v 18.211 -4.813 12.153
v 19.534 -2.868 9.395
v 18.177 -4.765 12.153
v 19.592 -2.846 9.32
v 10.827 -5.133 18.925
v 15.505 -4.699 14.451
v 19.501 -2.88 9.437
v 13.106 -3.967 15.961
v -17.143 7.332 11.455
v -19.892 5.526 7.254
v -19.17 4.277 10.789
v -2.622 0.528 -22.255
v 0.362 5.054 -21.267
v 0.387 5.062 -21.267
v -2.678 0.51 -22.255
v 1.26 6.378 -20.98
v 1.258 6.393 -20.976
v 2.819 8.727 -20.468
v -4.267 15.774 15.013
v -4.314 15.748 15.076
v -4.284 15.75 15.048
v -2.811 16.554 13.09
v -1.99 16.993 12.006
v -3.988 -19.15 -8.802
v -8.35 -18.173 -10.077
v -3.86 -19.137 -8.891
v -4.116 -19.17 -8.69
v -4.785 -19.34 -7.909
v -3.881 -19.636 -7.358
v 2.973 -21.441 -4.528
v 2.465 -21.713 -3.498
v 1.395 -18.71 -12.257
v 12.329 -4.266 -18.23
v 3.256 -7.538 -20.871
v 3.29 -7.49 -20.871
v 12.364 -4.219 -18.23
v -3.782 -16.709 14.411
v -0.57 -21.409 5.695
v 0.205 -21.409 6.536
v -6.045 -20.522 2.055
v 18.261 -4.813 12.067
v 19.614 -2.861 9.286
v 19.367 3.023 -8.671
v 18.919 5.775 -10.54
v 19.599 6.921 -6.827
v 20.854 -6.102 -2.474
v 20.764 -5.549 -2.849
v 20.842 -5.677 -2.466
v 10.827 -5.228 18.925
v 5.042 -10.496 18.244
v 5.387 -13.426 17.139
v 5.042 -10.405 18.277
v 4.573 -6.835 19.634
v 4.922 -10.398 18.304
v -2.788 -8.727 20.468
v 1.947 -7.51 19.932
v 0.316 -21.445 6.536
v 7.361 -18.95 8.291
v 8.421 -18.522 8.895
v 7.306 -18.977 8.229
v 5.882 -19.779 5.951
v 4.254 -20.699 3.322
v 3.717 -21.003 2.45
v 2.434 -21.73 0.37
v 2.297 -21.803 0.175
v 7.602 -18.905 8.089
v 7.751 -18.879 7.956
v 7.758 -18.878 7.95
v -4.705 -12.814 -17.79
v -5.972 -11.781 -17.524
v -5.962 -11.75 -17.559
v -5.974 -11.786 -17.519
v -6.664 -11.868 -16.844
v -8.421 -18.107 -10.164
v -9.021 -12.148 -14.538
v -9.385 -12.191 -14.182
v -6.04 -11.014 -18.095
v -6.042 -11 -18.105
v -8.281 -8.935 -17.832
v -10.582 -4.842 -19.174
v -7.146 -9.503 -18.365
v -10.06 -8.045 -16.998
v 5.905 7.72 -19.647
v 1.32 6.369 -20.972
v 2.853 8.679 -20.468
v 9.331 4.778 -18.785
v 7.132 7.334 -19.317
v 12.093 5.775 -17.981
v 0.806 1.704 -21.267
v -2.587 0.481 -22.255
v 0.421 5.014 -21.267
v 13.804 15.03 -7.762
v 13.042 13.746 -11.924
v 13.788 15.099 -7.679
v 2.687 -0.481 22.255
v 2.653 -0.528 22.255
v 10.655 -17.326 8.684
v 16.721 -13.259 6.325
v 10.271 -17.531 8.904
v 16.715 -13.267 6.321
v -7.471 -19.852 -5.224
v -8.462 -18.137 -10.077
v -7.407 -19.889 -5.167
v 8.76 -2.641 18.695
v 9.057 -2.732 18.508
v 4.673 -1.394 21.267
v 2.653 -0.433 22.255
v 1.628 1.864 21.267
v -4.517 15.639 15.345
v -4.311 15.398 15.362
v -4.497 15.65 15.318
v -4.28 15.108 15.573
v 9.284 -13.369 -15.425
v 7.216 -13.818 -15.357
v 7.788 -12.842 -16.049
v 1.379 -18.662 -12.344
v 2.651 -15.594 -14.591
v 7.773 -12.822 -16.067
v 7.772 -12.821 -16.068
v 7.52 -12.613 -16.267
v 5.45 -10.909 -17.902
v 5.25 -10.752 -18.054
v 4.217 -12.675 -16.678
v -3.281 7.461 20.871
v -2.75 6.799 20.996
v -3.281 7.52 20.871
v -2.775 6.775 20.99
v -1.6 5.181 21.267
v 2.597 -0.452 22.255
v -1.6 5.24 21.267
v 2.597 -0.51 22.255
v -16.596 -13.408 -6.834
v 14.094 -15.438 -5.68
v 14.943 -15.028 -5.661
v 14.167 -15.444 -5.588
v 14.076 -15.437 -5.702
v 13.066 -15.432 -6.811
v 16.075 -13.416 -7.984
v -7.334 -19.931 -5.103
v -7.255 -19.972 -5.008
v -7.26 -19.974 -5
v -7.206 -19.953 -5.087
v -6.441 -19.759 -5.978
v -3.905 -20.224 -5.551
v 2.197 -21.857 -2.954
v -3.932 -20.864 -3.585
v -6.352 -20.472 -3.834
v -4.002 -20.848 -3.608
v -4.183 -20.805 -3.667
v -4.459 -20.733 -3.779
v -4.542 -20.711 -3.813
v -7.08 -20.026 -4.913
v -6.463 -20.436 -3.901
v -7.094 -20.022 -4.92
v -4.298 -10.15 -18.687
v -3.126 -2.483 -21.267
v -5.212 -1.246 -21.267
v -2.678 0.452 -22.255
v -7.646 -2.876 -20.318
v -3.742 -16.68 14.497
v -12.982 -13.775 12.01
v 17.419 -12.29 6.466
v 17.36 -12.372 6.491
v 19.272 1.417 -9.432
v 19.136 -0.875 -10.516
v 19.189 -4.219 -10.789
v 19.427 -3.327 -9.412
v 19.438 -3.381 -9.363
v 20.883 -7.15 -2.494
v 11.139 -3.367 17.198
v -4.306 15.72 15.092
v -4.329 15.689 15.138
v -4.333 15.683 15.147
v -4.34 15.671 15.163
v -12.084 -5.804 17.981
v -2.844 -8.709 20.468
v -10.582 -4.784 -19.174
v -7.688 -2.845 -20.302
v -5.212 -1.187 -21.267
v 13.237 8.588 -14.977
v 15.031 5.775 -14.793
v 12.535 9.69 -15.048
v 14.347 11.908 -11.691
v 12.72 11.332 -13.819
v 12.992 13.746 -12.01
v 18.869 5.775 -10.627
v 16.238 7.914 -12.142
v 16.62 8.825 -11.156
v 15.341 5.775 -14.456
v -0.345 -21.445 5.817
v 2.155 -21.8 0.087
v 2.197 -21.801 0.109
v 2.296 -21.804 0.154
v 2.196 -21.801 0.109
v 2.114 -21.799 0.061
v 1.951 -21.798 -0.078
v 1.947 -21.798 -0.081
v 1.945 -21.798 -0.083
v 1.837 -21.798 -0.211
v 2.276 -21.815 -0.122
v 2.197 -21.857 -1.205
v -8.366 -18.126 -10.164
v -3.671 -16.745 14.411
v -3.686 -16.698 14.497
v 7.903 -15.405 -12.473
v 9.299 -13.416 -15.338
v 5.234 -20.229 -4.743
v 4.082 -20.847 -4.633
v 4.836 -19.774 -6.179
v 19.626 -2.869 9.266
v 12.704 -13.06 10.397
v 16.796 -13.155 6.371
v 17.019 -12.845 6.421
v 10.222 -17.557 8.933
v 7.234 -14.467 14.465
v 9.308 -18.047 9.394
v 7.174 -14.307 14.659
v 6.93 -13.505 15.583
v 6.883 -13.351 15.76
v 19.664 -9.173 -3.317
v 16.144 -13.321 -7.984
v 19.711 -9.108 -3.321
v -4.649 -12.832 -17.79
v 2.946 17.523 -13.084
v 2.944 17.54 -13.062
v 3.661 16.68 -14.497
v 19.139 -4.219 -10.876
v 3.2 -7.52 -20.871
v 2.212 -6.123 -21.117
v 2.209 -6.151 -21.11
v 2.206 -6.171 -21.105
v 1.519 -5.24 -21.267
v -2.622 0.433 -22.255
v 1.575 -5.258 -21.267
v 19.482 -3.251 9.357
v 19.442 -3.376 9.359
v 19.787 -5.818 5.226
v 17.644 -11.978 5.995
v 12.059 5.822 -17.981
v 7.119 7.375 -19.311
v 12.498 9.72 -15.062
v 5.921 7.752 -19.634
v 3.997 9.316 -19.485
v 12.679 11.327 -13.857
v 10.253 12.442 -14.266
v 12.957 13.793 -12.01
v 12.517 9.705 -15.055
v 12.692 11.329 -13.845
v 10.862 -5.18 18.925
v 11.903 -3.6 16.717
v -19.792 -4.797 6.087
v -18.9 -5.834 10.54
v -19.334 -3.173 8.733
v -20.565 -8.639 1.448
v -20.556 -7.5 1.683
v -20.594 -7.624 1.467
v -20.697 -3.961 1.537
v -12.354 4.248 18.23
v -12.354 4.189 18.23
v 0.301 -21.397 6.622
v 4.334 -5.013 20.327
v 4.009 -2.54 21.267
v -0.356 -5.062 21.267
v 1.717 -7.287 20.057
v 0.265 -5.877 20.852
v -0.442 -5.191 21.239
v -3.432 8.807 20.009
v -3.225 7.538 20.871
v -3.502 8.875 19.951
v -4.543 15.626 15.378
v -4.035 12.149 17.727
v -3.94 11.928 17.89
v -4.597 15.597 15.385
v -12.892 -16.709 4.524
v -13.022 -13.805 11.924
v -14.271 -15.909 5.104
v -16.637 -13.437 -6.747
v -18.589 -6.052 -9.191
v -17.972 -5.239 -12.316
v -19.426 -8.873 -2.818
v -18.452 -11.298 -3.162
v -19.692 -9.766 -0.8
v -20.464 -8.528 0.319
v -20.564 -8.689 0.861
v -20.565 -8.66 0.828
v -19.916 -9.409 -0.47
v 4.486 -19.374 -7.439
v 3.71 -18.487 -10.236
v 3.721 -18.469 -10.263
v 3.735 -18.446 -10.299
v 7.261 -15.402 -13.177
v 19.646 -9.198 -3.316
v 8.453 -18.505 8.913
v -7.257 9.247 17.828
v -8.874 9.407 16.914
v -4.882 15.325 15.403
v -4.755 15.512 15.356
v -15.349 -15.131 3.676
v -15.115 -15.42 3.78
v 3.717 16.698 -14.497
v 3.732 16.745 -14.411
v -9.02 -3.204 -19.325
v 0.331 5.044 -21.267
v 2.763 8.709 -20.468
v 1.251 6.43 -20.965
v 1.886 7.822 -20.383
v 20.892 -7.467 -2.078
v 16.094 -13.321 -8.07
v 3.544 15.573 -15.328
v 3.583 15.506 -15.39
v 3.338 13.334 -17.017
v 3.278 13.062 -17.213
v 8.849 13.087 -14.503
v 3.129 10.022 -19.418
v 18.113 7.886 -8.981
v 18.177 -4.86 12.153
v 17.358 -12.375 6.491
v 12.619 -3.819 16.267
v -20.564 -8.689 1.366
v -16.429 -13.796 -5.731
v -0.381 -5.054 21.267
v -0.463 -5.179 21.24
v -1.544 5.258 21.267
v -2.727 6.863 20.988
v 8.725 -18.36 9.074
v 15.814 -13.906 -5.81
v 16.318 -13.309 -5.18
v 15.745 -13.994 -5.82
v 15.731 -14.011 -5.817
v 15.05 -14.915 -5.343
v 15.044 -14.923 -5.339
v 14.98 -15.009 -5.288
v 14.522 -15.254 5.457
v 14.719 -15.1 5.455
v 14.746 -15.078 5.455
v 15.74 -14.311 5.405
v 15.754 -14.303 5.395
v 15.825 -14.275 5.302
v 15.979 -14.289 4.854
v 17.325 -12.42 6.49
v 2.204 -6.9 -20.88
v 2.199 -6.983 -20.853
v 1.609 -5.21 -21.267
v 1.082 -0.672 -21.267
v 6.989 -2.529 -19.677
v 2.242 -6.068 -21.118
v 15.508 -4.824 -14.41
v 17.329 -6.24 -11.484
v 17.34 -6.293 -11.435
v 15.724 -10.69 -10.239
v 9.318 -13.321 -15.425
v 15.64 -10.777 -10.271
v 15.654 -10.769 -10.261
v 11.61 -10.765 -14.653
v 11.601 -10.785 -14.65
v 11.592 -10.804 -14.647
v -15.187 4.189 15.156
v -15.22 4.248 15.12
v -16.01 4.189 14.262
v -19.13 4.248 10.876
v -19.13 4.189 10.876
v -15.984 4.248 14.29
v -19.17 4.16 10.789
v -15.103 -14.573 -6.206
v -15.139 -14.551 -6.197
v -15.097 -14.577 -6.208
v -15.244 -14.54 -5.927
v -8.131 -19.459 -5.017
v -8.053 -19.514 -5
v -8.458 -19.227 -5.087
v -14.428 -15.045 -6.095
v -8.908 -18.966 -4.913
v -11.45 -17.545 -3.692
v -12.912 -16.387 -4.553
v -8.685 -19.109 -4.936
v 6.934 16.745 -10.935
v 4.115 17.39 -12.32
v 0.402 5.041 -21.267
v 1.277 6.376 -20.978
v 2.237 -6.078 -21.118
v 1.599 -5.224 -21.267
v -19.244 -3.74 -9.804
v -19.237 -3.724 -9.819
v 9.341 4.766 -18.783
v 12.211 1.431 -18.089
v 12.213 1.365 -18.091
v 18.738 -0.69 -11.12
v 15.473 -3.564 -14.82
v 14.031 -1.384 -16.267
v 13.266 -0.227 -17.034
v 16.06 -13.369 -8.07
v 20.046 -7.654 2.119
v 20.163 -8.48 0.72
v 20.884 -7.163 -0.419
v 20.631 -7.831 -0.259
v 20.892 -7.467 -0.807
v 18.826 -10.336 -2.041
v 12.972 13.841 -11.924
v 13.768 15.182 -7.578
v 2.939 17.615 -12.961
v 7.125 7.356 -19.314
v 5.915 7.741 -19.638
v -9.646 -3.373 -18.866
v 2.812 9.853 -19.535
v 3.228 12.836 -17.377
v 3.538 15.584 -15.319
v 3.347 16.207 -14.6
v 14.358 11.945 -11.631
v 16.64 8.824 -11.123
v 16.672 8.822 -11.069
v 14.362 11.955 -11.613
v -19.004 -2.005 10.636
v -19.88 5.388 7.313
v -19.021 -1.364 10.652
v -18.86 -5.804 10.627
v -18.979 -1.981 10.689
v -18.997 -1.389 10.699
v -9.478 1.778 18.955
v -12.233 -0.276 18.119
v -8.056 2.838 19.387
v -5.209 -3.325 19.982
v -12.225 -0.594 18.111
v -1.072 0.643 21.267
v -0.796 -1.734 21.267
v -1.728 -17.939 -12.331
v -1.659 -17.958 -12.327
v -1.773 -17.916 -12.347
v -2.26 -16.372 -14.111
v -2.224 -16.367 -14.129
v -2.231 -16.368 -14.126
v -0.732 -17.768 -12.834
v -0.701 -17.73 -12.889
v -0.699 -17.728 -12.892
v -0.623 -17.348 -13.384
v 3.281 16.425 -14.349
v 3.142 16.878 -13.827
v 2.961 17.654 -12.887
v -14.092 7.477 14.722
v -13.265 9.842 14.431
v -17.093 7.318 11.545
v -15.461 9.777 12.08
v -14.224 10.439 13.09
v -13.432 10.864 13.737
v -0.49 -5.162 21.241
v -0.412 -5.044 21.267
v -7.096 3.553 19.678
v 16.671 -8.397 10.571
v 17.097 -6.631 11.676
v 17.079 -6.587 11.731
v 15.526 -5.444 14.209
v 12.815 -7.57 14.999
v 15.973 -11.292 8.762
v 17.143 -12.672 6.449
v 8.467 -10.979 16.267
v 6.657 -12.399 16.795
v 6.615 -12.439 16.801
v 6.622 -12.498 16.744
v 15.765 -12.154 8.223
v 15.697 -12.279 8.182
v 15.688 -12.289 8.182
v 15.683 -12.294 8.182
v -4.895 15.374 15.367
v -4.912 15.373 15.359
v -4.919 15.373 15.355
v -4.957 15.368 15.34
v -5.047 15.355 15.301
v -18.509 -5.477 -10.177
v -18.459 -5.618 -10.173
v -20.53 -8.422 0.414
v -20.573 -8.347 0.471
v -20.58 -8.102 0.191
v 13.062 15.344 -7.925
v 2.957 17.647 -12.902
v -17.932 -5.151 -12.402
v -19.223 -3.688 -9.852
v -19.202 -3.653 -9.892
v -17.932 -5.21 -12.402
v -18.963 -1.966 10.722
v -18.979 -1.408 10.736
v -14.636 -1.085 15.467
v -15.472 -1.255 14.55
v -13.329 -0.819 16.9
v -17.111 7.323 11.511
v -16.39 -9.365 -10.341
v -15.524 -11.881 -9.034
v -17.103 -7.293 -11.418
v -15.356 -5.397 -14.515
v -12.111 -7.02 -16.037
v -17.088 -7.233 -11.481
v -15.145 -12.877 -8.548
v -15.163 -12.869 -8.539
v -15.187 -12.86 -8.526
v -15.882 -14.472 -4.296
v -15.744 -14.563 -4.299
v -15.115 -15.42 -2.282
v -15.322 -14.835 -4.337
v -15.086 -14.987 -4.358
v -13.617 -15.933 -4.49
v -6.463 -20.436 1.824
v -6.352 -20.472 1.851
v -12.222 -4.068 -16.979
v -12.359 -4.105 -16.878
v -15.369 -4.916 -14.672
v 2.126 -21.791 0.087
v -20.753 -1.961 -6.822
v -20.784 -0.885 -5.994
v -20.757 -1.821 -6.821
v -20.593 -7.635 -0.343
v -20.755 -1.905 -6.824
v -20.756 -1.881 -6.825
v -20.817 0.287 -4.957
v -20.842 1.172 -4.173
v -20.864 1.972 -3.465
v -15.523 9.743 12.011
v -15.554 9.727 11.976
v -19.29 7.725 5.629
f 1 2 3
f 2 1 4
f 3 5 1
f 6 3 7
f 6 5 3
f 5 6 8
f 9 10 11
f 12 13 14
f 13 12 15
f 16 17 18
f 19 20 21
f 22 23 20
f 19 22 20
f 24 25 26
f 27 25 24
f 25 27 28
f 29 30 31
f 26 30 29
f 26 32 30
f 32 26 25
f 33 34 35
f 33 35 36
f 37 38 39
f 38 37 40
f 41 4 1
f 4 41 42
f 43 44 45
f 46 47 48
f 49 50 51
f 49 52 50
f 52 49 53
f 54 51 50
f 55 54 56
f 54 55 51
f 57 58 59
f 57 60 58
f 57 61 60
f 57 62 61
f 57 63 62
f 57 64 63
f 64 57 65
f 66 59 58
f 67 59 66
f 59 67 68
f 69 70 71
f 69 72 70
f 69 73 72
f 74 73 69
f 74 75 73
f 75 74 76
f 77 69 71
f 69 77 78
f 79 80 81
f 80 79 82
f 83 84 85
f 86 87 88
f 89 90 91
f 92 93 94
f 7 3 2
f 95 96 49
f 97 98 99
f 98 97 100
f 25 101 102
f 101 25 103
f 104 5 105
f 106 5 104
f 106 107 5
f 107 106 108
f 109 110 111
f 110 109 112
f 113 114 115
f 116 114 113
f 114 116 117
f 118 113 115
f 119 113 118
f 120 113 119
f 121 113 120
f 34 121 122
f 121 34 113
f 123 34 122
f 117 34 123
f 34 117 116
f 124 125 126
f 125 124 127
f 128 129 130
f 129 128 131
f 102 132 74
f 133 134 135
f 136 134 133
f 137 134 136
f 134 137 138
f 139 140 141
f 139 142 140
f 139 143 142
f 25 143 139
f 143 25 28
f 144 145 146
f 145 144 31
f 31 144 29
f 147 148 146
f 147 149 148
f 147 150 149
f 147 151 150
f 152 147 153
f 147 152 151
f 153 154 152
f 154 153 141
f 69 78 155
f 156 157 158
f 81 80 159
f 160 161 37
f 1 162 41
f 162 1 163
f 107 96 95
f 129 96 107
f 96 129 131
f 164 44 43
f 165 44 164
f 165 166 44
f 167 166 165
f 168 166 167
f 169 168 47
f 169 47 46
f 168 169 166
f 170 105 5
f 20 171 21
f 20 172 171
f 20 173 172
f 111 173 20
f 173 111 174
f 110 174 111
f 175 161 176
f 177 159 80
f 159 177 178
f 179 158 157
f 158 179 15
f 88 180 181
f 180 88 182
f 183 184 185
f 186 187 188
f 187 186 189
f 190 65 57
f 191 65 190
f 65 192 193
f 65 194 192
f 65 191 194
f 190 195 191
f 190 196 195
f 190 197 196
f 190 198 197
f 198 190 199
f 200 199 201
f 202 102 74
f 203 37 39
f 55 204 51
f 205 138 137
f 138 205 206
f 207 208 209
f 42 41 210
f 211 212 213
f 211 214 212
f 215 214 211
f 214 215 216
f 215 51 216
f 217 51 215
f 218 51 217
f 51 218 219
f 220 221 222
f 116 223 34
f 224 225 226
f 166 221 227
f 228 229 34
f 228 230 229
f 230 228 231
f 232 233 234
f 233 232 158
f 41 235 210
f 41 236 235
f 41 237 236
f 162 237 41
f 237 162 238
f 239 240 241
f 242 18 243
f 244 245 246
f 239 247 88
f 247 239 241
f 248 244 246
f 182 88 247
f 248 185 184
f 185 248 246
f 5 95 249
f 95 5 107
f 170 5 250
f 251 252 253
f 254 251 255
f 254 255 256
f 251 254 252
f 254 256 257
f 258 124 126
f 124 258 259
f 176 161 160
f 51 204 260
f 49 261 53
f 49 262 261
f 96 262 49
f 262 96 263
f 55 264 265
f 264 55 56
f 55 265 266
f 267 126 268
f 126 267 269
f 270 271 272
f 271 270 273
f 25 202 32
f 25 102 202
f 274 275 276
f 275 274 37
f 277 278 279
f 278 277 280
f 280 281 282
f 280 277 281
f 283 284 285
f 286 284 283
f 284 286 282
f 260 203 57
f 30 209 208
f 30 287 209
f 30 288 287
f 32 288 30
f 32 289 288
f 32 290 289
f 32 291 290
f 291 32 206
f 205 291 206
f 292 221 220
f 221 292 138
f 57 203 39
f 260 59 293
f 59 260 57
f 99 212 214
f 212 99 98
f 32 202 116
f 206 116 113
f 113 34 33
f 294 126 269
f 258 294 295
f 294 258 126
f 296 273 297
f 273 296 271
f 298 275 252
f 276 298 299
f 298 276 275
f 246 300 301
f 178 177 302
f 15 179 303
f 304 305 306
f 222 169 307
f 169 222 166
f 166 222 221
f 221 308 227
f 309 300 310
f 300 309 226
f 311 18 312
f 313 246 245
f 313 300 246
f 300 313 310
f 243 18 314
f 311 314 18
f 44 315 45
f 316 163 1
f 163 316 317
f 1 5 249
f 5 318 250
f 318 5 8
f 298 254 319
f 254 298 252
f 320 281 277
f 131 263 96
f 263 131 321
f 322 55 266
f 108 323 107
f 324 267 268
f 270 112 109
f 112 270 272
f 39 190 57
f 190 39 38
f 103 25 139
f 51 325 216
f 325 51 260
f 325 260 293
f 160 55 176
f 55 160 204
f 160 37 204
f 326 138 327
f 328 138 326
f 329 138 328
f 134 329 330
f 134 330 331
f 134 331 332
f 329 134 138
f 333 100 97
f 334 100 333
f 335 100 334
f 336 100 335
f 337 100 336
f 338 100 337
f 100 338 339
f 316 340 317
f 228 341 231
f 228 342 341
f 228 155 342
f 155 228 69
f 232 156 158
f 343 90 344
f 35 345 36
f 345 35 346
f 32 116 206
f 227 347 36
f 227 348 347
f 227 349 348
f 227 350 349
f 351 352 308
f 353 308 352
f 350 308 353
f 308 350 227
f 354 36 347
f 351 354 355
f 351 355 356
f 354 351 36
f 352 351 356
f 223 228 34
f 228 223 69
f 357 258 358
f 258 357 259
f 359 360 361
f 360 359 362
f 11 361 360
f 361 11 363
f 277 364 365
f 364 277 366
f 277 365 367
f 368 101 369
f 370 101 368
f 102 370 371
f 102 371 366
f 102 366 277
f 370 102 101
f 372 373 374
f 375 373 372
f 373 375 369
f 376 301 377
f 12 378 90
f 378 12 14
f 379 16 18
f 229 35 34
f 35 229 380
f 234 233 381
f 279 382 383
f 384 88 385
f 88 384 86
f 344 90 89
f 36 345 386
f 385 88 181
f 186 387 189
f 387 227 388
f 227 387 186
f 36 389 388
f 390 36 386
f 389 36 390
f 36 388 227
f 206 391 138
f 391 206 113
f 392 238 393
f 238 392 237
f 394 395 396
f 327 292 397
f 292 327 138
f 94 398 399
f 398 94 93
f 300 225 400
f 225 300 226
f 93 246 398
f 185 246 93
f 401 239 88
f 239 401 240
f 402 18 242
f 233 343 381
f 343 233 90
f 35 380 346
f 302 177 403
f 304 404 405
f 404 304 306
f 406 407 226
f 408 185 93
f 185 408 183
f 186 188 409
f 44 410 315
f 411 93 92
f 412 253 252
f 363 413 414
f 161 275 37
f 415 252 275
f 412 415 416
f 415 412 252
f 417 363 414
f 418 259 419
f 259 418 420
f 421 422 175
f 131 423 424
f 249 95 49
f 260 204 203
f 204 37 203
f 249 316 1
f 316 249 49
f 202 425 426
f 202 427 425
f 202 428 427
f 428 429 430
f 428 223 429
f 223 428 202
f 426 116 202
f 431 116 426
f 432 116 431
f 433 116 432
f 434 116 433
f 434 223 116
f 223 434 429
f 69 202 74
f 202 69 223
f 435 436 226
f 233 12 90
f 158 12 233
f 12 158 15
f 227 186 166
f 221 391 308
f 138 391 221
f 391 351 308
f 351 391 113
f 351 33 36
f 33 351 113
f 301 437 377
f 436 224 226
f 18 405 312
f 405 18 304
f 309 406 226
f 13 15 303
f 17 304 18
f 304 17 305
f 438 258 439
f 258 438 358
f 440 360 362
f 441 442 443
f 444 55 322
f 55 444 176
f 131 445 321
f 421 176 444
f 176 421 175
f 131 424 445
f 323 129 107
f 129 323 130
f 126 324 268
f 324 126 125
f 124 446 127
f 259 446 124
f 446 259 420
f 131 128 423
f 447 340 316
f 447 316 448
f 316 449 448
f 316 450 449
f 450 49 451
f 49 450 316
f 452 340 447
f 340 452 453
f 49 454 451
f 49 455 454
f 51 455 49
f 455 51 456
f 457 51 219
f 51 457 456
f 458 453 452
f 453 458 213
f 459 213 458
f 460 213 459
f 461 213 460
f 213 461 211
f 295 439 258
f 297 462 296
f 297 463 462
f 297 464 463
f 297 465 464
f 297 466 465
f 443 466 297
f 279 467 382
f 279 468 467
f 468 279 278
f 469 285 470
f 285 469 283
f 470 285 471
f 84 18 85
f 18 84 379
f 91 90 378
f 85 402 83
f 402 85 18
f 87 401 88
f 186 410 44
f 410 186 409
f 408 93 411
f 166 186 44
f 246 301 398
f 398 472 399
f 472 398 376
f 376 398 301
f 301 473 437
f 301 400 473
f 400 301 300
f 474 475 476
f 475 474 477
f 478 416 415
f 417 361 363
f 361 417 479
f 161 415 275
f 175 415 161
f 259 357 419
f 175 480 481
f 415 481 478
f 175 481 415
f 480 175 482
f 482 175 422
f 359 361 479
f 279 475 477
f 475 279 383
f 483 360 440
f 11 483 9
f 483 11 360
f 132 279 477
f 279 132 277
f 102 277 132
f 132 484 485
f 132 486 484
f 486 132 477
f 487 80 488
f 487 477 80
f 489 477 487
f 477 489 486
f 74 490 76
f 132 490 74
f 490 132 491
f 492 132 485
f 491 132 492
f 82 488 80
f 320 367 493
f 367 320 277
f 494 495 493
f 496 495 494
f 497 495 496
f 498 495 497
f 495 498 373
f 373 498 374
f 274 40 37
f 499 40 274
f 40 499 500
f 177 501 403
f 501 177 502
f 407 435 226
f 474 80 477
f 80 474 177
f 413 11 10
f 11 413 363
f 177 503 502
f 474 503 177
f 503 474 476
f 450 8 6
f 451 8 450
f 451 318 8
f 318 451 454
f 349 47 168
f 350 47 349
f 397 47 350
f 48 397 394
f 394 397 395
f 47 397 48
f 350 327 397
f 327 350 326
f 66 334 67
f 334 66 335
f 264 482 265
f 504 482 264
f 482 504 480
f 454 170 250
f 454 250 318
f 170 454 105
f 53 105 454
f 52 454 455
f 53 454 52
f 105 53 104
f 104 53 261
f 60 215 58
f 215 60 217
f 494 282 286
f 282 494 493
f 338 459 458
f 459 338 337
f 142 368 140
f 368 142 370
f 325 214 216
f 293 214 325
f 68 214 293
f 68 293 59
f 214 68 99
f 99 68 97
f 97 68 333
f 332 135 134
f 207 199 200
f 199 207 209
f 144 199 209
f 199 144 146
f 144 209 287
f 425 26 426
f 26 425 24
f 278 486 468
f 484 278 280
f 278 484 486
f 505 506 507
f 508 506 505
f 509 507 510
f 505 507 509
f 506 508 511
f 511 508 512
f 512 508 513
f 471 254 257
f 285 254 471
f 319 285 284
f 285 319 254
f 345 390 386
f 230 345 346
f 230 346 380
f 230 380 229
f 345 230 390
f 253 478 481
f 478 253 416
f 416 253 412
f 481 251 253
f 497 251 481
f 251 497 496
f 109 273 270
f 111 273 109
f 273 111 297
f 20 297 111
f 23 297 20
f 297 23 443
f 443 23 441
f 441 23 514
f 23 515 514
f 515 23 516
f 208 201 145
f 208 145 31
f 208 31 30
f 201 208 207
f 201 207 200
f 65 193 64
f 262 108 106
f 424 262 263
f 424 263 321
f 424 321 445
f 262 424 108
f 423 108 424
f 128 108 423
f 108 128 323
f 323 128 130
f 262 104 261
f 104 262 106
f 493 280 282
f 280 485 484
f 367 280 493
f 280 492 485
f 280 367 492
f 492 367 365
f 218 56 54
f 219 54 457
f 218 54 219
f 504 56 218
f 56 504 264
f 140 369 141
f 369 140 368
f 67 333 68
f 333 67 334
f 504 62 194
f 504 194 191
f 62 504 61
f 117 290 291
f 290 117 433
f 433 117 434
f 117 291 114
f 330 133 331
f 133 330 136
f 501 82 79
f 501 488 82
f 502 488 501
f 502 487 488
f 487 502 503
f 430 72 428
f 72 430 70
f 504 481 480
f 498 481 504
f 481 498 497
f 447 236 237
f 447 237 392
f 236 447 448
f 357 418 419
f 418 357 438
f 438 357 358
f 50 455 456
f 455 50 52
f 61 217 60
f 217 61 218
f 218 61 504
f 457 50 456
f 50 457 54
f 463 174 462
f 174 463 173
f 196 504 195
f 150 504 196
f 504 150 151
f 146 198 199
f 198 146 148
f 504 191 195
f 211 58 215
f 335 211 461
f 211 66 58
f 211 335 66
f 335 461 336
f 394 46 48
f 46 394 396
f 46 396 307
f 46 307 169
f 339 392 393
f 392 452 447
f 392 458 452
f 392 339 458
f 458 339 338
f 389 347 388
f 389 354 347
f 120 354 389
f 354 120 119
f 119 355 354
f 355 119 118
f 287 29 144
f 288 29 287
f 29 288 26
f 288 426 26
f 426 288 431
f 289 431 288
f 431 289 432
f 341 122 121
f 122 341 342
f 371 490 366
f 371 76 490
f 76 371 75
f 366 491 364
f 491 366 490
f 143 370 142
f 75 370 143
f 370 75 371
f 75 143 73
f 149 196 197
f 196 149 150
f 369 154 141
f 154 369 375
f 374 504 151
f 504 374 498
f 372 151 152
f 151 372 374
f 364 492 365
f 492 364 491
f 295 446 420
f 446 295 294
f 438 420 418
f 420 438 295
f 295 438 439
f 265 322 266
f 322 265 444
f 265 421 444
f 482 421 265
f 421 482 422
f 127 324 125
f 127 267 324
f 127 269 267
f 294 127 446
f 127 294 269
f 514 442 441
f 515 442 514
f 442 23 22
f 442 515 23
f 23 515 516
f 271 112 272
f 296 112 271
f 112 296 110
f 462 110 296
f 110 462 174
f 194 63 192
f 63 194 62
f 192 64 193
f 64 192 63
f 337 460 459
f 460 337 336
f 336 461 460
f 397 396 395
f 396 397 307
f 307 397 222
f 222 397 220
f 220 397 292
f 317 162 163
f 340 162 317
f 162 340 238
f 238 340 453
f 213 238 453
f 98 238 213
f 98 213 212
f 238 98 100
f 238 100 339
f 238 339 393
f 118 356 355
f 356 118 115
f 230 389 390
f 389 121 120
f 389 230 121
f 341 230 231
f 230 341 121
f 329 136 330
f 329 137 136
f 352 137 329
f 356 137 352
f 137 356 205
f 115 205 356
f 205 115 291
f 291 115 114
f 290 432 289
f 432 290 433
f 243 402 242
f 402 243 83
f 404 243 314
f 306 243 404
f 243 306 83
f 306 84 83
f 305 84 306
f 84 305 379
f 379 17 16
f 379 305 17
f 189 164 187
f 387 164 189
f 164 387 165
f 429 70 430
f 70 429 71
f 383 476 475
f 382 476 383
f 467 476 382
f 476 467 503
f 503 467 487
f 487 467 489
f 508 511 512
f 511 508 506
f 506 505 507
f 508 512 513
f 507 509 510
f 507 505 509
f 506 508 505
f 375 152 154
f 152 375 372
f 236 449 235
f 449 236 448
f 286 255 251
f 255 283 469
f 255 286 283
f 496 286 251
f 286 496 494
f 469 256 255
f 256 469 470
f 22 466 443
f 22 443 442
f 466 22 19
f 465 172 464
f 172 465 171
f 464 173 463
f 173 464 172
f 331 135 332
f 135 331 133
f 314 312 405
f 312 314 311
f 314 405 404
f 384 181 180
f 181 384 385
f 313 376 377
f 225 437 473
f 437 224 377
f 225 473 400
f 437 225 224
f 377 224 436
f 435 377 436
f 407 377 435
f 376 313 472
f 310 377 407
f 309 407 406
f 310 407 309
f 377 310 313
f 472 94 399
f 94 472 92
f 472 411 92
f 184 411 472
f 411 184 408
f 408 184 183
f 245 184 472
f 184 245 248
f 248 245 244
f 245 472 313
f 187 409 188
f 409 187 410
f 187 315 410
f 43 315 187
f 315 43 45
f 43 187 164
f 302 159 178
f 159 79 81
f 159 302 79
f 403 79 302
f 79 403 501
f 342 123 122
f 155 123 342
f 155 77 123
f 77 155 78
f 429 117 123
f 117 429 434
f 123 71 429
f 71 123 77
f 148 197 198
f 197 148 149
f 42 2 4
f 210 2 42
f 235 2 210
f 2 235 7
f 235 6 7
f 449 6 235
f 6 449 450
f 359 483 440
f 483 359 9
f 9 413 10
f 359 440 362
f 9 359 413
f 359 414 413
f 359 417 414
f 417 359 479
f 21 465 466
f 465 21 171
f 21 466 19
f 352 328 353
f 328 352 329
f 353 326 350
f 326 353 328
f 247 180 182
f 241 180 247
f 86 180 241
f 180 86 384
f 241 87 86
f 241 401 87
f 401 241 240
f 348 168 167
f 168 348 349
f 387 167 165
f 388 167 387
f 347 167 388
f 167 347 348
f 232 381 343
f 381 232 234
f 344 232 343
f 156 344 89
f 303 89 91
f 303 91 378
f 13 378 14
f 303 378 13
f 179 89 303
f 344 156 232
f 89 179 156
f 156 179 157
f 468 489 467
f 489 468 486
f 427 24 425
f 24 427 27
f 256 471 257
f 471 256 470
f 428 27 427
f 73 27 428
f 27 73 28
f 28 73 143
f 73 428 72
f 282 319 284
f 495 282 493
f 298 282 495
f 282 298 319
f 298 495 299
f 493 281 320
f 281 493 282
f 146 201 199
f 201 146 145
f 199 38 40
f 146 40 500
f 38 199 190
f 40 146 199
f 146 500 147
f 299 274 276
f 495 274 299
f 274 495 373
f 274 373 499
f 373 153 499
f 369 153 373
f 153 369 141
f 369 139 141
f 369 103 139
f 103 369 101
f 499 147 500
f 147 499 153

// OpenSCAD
// Auto-generated OpenSCAD file

    inner_points = 10*[[1.529747169709951, 0.0887684815985697, 1.6180339887495454], [-0.6650403250001585, -1.087029682257868, -1.8090169943750285], [0.6748581958379799, 0.22720562383973383, 2.1180339887497732], [-1.5199292988721298, -0.9485925400167037, -1.3090169943748005], [1.502961023190905, 1.0394477122238417, 1.3090169943748005], [-0.6918264715192047, -0.13635045163259588, -2.1180339887497732], [0.6480720493189337, 1.1778848544650058, 1.8090169943750285], [-1.5467154453911758, 0.0020866906085682327, -1.6180339887495454], [0.7347538403093706, -1.8985777606351613, 0.8090169943743729], [0.21663479539132455, -2.176146055124717, -5.111466805374221e-13], [0.6212859027994219, 2.128564085090691, -0.49999999999971656], [0.10316685788137583, 1.8509957906011352, -1.3090169943746006], [2.0626732322522554, -0.15918577764171576, 0.8090169943744226], [1.5565333162282435, -0.8619107490260339, -1.309016994375499], [-1.5467154453904224, 0.002086690607900017, 1.618033988750244], [-2.0648344903084683, -0.27548160388165555, 0.8090169943753601], [2.035887085733209, 0.7914934529835562, 0.4999999999996777], [1.5297471697091976, 0.08876848159923792, -1.618033988750244], [-1.5735015919094684, 0.9527659212331719, 1.309016994375499], [-2.0916206368275145, 0.6751976267436165, 0.5000000000006152], [2.0626732322518784, -0.15918577764138167, -0.809016994375472], [0.1732938998954964, -0.6379147475740927, -2.1180339887500783], [-0.1902621755767213, 0.7287699197812307, 2.1180339887500783], [-2.0648344903088454, -0.2754816038813214, -0.8090169943745347], [0.7181990913331984, -1.3110256837103498, 1.6180339887494455], [-0.6382541784808796, -2.037708912883346, -0.5000000000002833], [0.6212859027996548, 2.128564085090484, 0.5000000000002833], [-0.7351673670144232, 1.4018808559174876, -1.6180339887494455], [1.5730880652047925, -1.4494628259511797, -0.500000000000677], [1.5029610231902952, 1.0394477122243824, -1.3090169943750942], [1.5565333162288535, -0.8619107490265745, 1.3090169943743954], [-0.12013513356321057, -1.7601406183934567, -1.309016994375294], [0.1732938998964831, -0.6379147475749672, 2.118033988749711], [-1.5033745498955808, -1.5361446169418493, -0.49999999999997824], [1.486406274214356, 1.6269997891489871, 0.49999999999997824], [-0.190262175577708, 0.7287699197821053, -2.118033988749711], [0.10316685788198571, 1.8509957906005945, 1.309016994375294], [-1.5735015919100783, 0.9527659212337125, -1.3090169943743954], [1.5730880652050256, -1.4494628259513862, 0.49999999999932293], [0.7347538403089937, -1.8985777606348273, -0.8090169943755219], [1.486406274214123, 1.6269997891491939, -0.5000000000000218], [0.6480720493180911, 1.1778848544657528, -1.8090169943748664], [2.079227981228428, -0.7467378545665272, -6.49896803039951e-13], [0.7181990913324445, -1.3110256837096819, -1.6180339887503443], [-0.6918264715182181, -0.13635045163347048, 2.1180339887500166], [-2.0482797413322964, -0.8630336808064671, 2.875200078022999e-13], [2.0358870857329765, 0.7914934529837627, -0.5000000000003222], [0.6748581958369932, 0.22720562384060844, -2.1180339887500166], [-0.7351673670136694, 1.4018808559168197, 1.6180339887503443], [-2.0916206368277477, 0.6751976267438229, -0.4999999999993848]];

    outer_points = 10*[[1.9089405079323911, -0.4218501272152671, -1.0789145401017997], [-1.2043326607979576, -0.577474804500691, 1.7894618380401386], [1.8819218900924022, 0.577474804500691, -1.054021265088006], [-1.2313512786379466, 0.4218501272152671, 1.8143551130539322], [1.2313512786379466, -0.4218501272152671, -1.8143551130539322], [-1.8819218900924022, -0.577474804500691, 1.054021265088006], [1.2043326607979576, 0.577474804500691, -1.7894618380401386], [-1.9089405079323911, 0.4218501272152671, 1.0789145401017997], [1.8161383771497412, -0.48129346445006527, 1.2066755875633466], [1.0811942768032063, -0.5180314672658928, 1.883807397859486], [-1.0541756589632172, -0.48129346445006527, -1.9087006728732798], [-1.789119759309752, -0.5180314672658928, -1.2315688625771404], [1.604429700784257, -1.3321032531169081, -0.7983572106372436], [0.028548915388096174, -2.1349731725874808, 0.6535613890536225], [0.6490403139063483, 2.1349731725874808, 0.08187918389851007], [-0.0859037864401867, 2.0982351697716535, 0.7590109941946495], [0.9268404714898124, -1.3321032531169081, -1.5337977835893761], [-0.6490403139063483, -2.1349731725874808, -0.08187918389851007], [-0.028548915388096174, 2.1349731725874808, -0.6535613890536225], [-0.7634930157346311, 2.0982351697716535, 0.02357042124251696], [0.3254392898648874, -2.188664775803015, -0.2998395325355988], [-1.2941585375254203, -1.3745929899519995, 1.192357232218884], [1.2941585375254203, 1.3745929899519995, -1.192357232218884], [-1.3648941973595563, 1.2416736470855463, 1.2575286722962942], [2.1878247482682935, 0.04809067002531284, 0.4440474477137366], [0.26371611372985215, -0.04809067002531284, 2.2168015419327753], [-0.26371611372985215, 0.04809067002531284, -2.2168015419327753], [-2.1878247482682935, -0.04809067002531284, -0.4440474477137366], [0.9358529551889134, -1.807795784376752, 0.9176718508015878], [-0.8380986775147881, -1.807795784376752, -1.0077365658927917], [2.097998871540831, -0.7490275154259958, -0.1530571581075182], [-0.28033019684298266, -0.8679141898955922, 2.038187409738281], [2.0542818295466843, 0.8679141898955922, -0.11277899304390138], [-0.3240472388371295, 0.7490275154259958, 2.0784655748018976], [0.3240472388371295, -0.7490275154259958, -2.0784655748018976], [-2.0542818295466843, -0.8679141898955922, 0.11277899304390138], [0.28033019684298266, 0.8679141898955922, -2.038187409738281], [-2.097998871540831, 0.7490275154259958, 0.1530571581075182], [1.7263125004222784, -1.2784116499013738, 0.609570981742092], [0.5371479662303715, -1.337854987136172, 1.7051932656649915], [-0.46641230639623543, -1.2784116499013738, -1.770364705742402], [-1.6555768405881424, -1.337854987136172, -0.6747424218195024], [1.2327433296657047, -1.8614873875922862, -0.03572907078763354], [-0.37015607357044544, -1.6650323753469007, 1.441082803917026], [1.4665184769797024, 1.6650323753469007, -0.2511149601747792], [-0.4575901575587392, 1.5688510352962752, 1.5216391340442594], [0.1363809262564476, -1.8614873875922862, -1.2256969145298804], [-1.4665184769797024, -1.6650323753469007, 0.2511149601747792], [0.37015607357044544, 1.6650323753469007, -1.441082803917026], [-1.5539525609679963, 1.5688510352962752, 0.3316712903020125]];

    // Convex hull for inner set (I)
    module inner_hull() {
        hull() {
            for (p = inner_points) {
                translate(p) sphere(r=0.1);
            }
        }
    }

    // Convex hull for outer set (O) minus inner hull (O \ I)
    module outer_minus_inner() {
        difference() {
            hull() {
                for (p = outer_points) {
                    translate(p) sphere(r=0.1);
                }
            }
            inner_hull(); // Subtract inner hull
        }
    }

    // Convex hull for outer set (O) minus all translated inner hulls
    module outer_minus_AllTranslationInner() {
        difference() {
            hull() {
                for (p = outer_points) {
                    translate(p) sphere(r=0.1);
                }
            }
            hull() {
                translate([0,0,50]) inner_hull();
                translate([0,0,-50]) inner_hull();
            }; // Subtract translated inner hulls
        }
    }

    // Difference between outer_minus_inner and outer_minus_AllTranslationInner
    module outer_minus_inner_diff() {
        difference() {
            // Outer minus inner
            difference() {
                hull() {
                    for (p = outer_points) {
                        translate(p) sphere(r=0.1);
                    }
                }
                inner_hull();
            }

            // Subtract Outer minus AllTranslationInner
            difference() {
                hull() {
                    for (p = outer_points) {
                        translate(p) sphere(r=0.1);
                    }
                }
                hull() {
                    translate([0,0,50]) inner_hull();
                    translate([0,0,-50]) inner_hull();
                };
            }
        }
    }

    // Rendering all with colors applied
    color([1, 1, 0, 1]) outer_minus_inner_diff(); // Opaque yellow
    
